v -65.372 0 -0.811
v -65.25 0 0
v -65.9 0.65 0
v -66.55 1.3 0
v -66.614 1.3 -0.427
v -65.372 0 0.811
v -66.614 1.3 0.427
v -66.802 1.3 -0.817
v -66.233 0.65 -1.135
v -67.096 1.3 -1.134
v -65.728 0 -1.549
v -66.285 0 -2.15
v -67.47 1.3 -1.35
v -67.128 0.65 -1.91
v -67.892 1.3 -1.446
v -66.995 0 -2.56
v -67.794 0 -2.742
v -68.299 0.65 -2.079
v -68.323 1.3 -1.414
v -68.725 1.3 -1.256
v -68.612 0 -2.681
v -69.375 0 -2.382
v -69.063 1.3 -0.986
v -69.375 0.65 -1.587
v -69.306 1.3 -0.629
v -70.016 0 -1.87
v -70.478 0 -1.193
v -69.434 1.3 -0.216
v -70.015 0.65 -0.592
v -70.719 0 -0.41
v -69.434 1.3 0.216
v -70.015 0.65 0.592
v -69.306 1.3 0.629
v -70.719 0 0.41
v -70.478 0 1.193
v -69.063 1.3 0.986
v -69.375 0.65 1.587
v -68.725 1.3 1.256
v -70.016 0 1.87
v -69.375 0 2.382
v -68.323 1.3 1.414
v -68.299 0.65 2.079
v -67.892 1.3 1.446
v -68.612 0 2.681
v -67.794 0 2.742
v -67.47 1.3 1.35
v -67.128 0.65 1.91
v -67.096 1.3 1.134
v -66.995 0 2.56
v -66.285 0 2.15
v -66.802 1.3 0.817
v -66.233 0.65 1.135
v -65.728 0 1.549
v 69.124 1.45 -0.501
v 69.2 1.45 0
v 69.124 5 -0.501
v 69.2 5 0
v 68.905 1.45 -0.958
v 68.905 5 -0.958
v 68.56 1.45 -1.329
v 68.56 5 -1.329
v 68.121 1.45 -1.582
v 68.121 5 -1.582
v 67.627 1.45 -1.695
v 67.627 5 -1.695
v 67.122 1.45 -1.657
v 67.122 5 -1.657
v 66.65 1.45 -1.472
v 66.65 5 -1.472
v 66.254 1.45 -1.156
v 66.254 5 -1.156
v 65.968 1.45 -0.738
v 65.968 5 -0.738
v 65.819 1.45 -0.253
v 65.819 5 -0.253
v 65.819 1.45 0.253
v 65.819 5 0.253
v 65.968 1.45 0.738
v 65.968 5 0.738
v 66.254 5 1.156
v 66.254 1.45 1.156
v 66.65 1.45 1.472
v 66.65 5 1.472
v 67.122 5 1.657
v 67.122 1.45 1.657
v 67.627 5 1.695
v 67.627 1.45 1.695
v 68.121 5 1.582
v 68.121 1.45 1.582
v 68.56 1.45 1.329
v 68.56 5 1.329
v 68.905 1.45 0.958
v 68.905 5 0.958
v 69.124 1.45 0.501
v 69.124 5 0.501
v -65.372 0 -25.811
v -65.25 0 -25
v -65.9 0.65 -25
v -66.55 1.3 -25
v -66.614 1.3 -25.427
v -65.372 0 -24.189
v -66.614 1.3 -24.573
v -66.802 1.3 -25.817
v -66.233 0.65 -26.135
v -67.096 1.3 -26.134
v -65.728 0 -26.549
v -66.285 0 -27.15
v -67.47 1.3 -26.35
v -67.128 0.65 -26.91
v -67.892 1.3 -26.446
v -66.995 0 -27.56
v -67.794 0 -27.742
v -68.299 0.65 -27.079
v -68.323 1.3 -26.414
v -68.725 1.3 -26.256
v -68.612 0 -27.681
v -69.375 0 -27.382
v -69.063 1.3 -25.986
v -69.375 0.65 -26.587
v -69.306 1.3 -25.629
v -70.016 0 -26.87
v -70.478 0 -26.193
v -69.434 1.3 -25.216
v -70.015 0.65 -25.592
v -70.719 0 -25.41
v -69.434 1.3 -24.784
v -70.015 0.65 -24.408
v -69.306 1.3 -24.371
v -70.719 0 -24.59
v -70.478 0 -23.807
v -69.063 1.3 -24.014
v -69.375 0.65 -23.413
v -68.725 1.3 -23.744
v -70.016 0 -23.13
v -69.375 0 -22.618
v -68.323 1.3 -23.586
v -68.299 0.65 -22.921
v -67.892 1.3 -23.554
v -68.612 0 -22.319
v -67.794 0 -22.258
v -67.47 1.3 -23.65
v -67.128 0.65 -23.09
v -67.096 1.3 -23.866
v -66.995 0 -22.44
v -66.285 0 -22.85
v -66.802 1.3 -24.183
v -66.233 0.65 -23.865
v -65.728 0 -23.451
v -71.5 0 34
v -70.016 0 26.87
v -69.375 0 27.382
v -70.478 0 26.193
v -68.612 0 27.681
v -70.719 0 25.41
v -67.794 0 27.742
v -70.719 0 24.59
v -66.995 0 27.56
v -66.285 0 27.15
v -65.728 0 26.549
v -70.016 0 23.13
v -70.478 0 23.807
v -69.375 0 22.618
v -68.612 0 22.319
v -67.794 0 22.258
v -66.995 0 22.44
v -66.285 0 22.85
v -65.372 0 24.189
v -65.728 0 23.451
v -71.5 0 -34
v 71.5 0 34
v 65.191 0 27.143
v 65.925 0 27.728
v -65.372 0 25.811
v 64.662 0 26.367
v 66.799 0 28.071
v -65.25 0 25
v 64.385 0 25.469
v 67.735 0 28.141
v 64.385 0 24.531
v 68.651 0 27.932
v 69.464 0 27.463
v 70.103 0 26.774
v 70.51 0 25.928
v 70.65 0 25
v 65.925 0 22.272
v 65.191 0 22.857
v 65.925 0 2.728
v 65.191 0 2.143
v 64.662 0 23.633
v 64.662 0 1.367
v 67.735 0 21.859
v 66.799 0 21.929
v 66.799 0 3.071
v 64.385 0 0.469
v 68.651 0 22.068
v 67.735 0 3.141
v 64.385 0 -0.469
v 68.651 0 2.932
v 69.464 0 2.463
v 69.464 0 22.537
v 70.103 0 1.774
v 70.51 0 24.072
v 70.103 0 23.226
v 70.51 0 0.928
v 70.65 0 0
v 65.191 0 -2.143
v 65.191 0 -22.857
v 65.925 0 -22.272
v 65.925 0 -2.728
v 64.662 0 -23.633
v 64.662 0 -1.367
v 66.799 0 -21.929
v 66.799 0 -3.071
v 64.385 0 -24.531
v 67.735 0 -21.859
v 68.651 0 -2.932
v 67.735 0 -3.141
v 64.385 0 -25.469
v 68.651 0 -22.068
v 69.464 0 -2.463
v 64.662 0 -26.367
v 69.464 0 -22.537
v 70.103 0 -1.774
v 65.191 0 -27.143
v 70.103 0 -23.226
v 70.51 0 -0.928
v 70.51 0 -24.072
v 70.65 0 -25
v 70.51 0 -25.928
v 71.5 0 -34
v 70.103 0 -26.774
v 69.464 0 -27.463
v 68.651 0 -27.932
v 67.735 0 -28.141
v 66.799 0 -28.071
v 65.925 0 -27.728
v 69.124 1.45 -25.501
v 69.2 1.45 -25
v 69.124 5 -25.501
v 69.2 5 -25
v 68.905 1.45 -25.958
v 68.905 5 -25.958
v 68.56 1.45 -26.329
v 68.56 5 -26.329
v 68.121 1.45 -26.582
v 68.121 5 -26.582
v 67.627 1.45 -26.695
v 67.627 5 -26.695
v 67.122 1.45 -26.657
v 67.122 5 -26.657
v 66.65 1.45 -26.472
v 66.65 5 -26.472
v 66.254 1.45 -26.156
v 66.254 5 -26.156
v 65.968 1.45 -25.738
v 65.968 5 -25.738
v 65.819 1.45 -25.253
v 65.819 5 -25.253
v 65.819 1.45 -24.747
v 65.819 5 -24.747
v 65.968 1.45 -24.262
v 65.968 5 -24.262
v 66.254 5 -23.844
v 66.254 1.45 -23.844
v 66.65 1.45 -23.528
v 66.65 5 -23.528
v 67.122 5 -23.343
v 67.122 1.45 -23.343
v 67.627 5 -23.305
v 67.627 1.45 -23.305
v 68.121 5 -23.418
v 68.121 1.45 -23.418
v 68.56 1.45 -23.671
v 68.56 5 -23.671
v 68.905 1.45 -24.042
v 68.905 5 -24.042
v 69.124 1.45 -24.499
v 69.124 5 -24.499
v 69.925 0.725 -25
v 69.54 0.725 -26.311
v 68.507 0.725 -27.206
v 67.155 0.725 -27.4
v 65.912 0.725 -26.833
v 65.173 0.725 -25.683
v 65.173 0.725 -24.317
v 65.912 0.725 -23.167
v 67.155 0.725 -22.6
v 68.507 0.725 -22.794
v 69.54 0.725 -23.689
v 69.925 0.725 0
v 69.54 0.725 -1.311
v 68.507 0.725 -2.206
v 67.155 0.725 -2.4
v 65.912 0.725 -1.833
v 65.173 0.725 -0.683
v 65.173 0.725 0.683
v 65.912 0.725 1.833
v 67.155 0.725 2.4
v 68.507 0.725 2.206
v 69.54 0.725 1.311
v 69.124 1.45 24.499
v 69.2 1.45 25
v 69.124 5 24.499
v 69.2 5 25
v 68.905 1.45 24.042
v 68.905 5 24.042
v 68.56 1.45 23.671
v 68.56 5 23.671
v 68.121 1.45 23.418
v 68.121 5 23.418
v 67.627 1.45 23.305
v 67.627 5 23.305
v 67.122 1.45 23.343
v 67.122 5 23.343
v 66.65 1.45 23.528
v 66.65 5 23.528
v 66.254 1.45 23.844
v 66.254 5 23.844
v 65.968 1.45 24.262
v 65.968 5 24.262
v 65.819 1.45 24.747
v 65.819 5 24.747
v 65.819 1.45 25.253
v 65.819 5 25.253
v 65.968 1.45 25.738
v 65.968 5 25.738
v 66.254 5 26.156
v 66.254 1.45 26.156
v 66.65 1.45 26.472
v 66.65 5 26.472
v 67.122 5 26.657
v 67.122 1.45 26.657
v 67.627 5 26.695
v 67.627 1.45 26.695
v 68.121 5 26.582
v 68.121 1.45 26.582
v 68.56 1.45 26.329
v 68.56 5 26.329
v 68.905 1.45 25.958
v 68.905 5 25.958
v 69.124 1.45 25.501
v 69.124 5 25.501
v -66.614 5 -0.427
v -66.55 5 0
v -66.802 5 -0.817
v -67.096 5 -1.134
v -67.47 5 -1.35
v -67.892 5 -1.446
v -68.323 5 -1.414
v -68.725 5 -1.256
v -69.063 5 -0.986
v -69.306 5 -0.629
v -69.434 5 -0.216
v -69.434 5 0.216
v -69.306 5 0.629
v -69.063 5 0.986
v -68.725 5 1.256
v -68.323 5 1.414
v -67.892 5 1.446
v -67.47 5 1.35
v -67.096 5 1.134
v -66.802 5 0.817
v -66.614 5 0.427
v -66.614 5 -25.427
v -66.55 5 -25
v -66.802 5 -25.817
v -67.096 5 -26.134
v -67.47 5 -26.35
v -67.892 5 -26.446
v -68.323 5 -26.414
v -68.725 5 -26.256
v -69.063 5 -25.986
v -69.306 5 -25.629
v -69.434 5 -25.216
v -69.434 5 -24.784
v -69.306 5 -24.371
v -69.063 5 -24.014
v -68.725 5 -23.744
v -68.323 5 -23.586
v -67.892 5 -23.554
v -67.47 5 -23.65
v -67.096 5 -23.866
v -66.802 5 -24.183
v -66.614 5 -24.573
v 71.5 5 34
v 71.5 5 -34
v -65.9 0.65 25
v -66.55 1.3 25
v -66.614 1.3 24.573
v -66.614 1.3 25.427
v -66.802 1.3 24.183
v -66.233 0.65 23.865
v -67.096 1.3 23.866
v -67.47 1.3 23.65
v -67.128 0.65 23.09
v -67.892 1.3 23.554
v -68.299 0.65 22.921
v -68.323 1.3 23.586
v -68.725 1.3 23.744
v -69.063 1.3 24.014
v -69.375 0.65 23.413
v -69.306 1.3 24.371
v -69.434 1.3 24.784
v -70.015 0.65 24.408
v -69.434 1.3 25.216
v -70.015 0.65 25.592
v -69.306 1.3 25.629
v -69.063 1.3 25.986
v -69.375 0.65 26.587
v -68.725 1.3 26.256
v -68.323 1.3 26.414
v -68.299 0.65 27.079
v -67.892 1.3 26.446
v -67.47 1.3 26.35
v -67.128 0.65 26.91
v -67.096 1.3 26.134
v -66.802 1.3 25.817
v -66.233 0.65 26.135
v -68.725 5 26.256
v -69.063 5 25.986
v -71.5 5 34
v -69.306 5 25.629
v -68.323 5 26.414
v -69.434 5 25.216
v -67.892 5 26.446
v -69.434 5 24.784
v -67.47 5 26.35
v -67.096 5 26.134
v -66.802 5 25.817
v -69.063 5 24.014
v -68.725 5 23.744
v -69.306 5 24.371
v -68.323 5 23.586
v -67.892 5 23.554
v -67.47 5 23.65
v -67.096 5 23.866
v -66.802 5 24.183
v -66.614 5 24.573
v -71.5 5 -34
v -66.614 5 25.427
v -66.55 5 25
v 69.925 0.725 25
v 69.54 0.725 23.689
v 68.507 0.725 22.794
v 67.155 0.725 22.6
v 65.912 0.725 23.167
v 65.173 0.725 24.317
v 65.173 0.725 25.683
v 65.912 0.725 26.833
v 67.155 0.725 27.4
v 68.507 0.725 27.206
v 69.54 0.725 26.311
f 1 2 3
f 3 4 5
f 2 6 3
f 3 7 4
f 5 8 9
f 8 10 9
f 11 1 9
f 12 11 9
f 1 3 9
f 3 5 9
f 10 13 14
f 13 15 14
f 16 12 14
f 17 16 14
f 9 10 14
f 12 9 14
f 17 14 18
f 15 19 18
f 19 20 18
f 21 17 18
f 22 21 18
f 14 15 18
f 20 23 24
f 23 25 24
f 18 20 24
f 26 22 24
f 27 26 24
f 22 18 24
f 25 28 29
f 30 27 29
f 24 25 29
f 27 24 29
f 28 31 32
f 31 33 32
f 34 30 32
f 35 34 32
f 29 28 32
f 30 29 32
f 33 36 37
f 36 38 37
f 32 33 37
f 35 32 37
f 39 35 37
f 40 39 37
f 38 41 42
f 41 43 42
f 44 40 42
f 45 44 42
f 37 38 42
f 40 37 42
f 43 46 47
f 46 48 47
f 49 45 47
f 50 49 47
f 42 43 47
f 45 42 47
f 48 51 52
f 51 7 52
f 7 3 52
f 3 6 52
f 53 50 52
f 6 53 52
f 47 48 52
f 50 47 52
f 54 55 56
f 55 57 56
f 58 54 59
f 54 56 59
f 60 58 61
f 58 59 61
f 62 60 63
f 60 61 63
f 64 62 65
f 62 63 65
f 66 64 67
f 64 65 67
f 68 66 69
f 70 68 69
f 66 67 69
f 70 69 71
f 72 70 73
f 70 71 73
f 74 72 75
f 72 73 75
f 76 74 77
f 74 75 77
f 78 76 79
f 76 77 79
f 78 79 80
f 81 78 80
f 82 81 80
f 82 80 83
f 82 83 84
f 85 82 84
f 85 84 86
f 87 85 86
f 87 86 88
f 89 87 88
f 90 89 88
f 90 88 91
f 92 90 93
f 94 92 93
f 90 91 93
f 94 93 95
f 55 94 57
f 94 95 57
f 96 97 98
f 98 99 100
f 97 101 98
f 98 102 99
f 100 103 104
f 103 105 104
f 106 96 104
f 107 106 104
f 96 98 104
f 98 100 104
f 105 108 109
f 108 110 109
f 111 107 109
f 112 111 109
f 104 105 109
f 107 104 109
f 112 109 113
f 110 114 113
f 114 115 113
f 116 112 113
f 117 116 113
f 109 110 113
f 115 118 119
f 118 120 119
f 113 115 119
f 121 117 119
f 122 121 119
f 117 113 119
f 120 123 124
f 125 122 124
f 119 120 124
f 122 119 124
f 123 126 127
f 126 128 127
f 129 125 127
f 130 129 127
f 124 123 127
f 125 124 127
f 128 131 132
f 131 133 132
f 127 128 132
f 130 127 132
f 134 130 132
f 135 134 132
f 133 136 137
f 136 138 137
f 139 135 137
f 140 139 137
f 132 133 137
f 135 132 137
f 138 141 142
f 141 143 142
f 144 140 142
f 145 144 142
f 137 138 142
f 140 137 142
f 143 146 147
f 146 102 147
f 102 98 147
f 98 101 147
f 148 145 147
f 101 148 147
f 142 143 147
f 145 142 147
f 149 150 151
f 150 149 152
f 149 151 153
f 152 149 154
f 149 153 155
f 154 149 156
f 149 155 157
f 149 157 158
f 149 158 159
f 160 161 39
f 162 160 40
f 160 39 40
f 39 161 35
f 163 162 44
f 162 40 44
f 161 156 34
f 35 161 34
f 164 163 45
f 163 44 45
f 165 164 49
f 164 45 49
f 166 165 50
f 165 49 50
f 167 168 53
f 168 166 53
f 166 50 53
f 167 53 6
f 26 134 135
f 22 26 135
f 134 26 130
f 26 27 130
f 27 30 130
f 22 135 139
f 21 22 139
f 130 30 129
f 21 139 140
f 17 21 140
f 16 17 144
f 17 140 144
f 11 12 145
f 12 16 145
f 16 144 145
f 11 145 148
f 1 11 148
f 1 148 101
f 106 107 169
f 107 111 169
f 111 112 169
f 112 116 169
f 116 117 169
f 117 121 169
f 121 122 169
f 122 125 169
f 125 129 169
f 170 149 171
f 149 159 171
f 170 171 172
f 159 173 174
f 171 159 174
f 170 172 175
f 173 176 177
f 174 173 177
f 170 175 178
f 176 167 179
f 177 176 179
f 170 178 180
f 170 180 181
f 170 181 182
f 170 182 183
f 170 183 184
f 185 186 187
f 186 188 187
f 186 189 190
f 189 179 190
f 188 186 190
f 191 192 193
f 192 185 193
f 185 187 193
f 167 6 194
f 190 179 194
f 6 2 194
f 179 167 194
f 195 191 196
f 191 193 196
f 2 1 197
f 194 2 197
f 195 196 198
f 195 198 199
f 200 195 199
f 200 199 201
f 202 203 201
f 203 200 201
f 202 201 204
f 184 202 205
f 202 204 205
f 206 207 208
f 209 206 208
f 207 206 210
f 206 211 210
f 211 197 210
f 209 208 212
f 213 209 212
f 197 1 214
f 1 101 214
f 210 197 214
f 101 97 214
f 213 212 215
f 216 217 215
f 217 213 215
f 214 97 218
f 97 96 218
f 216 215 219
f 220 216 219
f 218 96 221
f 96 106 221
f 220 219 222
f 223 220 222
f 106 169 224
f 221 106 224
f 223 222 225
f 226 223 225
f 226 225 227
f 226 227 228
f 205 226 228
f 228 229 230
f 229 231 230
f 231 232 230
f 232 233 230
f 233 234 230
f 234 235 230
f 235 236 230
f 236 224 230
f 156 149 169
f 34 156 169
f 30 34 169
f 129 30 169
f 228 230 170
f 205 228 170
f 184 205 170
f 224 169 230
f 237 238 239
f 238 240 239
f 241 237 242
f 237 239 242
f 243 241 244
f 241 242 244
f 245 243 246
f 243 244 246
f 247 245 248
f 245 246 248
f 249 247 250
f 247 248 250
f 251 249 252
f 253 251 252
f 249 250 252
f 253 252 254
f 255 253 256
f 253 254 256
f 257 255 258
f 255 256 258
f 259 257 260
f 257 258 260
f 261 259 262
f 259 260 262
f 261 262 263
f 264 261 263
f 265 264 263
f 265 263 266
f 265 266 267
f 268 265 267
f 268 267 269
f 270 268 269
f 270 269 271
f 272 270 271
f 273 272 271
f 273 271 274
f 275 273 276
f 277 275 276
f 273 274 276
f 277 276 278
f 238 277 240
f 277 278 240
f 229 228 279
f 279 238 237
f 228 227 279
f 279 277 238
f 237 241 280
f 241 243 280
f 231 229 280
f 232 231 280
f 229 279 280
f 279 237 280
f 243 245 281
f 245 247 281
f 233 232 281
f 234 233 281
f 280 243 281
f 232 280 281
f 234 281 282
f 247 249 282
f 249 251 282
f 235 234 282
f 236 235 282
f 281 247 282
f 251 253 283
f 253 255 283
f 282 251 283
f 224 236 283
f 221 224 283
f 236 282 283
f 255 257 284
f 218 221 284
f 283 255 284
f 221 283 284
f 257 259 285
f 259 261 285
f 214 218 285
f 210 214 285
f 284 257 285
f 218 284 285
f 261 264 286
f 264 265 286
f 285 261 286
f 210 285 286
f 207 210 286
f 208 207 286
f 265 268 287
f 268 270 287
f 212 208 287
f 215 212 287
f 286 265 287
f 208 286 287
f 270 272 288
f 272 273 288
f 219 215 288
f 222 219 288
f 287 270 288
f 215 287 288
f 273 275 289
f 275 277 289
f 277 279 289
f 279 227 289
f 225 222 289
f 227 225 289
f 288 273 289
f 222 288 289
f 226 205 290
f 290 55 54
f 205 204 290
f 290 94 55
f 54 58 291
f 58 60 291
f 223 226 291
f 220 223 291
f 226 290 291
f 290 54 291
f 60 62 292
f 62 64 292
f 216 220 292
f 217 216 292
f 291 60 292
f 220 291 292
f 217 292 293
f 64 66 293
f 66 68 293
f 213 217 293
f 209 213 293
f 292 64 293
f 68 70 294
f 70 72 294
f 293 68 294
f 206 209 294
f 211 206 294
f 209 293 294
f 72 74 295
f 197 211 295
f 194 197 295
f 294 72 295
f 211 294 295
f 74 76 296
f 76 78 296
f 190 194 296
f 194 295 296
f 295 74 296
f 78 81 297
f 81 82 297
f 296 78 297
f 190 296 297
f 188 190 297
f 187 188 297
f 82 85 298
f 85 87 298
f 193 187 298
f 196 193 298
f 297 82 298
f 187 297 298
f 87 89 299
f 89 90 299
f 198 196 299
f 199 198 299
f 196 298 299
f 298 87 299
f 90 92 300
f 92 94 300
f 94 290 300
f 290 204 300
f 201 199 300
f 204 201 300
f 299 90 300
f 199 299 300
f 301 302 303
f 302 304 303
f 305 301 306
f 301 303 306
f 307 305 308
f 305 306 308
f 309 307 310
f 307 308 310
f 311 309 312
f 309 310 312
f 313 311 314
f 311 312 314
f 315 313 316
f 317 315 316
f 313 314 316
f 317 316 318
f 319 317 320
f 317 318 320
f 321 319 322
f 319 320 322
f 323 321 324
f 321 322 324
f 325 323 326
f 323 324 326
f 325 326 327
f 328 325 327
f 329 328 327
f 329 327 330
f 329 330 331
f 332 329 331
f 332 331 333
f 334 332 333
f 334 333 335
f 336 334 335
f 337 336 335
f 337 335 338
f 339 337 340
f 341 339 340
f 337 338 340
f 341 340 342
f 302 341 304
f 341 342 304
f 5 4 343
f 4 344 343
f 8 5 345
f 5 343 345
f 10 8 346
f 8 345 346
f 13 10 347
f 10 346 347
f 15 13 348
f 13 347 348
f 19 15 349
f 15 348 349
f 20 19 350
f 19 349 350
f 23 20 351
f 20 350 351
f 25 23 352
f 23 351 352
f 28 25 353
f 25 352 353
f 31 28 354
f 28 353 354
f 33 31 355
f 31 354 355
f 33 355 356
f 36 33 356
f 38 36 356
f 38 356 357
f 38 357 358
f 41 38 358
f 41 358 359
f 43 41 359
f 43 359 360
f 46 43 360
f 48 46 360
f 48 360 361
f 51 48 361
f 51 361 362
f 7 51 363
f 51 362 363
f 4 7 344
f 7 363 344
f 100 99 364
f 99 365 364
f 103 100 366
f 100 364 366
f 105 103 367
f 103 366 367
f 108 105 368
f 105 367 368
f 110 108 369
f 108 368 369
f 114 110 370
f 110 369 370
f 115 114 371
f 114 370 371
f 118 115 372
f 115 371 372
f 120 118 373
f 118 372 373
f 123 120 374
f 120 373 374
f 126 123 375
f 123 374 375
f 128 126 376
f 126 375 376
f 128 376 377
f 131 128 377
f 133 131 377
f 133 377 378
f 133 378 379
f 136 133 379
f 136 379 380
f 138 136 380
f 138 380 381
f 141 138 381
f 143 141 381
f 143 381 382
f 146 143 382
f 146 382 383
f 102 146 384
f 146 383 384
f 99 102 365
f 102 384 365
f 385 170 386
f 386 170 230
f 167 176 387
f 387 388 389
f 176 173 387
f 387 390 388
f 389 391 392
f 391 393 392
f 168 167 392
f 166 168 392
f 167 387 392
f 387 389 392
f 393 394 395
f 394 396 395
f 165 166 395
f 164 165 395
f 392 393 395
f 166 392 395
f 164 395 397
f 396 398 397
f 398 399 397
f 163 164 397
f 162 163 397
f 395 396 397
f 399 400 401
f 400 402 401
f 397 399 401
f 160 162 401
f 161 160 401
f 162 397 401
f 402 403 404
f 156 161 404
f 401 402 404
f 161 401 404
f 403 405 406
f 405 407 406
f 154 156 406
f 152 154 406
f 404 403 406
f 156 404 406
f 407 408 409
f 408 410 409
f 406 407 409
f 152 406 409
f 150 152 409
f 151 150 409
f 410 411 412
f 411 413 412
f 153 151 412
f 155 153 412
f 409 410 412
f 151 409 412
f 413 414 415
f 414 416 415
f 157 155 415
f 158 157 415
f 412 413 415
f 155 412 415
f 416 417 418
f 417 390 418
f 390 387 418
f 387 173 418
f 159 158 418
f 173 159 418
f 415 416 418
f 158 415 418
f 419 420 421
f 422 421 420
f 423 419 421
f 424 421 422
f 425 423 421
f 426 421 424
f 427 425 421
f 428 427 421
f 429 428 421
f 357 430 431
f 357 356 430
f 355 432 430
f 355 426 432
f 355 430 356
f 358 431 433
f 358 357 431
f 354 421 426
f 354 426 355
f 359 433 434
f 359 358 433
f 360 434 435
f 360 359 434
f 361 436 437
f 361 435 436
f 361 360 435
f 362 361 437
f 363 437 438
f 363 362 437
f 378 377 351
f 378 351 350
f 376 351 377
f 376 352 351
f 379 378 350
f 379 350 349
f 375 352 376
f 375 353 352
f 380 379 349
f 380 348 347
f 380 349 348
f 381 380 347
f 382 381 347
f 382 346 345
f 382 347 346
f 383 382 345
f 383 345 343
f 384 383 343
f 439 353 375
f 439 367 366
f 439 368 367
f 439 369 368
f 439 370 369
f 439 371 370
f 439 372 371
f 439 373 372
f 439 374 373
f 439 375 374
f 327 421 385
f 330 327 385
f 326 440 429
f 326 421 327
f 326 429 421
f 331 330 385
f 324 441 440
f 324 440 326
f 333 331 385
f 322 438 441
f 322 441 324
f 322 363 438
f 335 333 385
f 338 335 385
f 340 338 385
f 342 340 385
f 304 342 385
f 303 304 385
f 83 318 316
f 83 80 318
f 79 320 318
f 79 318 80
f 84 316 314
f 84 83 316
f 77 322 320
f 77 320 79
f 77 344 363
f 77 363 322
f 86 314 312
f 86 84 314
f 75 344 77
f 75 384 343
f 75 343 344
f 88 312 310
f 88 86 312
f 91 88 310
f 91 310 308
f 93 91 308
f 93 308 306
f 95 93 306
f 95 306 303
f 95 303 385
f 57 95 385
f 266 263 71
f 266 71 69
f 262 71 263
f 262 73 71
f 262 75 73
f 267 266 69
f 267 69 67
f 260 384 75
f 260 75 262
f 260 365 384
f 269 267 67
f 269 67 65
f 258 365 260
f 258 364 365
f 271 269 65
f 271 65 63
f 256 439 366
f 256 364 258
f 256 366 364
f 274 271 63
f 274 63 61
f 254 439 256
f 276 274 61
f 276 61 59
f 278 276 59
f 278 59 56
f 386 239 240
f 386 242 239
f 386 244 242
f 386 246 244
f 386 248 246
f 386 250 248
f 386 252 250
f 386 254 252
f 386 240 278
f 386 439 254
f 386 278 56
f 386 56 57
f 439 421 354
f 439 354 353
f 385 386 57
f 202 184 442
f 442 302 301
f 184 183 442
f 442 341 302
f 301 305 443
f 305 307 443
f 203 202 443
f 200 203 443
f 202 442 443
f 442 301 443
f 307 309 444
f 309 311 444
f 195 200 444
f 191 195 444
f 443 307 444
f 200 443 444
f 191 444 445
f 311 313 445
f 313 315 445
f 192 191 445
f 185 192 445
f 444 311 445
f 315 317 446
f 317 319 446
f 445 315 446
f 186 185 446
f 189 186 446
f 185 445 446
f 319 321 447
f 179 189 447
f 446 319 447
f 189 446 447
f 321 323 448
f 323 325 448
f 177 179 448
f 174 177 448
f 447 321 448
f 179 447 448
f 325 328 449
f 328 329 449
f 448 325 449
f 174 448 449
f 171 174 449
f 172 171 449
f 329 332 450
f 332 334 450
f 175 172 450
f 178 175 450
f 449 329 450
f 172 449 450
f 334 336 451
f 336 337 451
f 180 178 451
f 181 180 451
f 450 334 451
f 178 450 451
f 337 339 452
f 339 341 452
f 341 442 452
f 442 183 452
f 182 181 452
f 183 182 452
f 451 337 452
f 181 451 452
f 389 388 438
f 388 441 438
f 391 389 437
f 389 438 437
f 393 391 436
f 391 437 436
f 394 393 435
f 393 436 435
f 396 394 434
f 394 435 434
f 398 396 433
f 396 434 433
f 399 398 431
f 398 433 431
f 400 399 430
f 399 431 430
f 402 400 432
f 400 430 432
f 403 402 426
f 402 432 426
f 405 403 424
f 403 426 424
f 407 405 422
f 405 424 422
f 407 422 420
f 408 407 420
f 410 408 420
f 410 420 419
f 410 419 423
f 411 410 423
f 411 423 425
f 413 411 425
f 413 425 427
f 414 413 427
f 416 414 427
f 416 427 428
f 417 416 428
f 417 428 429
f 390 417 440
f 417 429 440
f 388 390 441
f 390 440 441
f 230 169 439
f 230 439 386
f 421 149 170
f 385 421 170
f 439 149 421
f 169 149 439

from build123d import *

# Parameters (mm, degrees)
SKETCH_1_W                     = 143
SKETCH_1_H                     = 68
EXTRUDE_1_DEPTH                = 5
HOLE_WIZARD_M2_5_1_D           = 2.9
HOLE_WIZARD_M2_5_1_CSINK_D     = 5.5
HOLE_WIZARD_M2_5_1_CSINK_ANGLE = 90
HOLE_WIZARD_M3_1_D             = 3.4
HOLE_WIZARD_M3_1_CSINK_D       = 6.3
HOLE_WIZARD_M3_1_CSINK_ANGLE   = 90


with BuildPart() as part:
    # 草圖1 → 填料-伸長1 (new body)
    with BuildSketch(Plane(origin=(0, 0, 0), x_dir=(1, 0, 0), z_dir=(0, 1, 0))):
        Rectangle(SKETCH_1_W, SKETCH_1_H)
    extrude(amount=EXTRUDE_1_DEPTH)

    # M2.5 錐坑平頭螺釘的錐孔1 (through all)
    with Locations(Plane(origin=(0, 0, 0), x_dir=(-1, 0, 0), z_dir=(0, -1, 0))):
        with Locations((68, 25), (68, 0), (68, -25)):
            CounterSinkHole(HOLE_WIZARD_M2_5_1_D / 2, HOLE_WIZARD_M2_5_1_CSINK_D / 2, counter_sink_angle=HOLE_WIZARD_M2_5_1_CSINK_ANGLE)

    # M3 錐坑平頭螺釘的錐孔1 (through all)
    with Locations(Plane(origin=(0, 0, 0), x_dir=(-1, 0, 0), z_dir=(0, -1, 0))):
        with Locations((-67.5, 25), (-67.5, 0), (-67.5, -25)):
            CounterSinkHole(HOLE_WIZARD_M3_1_D / 2, HOLE_WIZARD_M3_1_CSINK_D / 2, counter_sink_angle=HOLE_WIZARD_M3_1_CSINK_ANGLE)


solid = part.part
